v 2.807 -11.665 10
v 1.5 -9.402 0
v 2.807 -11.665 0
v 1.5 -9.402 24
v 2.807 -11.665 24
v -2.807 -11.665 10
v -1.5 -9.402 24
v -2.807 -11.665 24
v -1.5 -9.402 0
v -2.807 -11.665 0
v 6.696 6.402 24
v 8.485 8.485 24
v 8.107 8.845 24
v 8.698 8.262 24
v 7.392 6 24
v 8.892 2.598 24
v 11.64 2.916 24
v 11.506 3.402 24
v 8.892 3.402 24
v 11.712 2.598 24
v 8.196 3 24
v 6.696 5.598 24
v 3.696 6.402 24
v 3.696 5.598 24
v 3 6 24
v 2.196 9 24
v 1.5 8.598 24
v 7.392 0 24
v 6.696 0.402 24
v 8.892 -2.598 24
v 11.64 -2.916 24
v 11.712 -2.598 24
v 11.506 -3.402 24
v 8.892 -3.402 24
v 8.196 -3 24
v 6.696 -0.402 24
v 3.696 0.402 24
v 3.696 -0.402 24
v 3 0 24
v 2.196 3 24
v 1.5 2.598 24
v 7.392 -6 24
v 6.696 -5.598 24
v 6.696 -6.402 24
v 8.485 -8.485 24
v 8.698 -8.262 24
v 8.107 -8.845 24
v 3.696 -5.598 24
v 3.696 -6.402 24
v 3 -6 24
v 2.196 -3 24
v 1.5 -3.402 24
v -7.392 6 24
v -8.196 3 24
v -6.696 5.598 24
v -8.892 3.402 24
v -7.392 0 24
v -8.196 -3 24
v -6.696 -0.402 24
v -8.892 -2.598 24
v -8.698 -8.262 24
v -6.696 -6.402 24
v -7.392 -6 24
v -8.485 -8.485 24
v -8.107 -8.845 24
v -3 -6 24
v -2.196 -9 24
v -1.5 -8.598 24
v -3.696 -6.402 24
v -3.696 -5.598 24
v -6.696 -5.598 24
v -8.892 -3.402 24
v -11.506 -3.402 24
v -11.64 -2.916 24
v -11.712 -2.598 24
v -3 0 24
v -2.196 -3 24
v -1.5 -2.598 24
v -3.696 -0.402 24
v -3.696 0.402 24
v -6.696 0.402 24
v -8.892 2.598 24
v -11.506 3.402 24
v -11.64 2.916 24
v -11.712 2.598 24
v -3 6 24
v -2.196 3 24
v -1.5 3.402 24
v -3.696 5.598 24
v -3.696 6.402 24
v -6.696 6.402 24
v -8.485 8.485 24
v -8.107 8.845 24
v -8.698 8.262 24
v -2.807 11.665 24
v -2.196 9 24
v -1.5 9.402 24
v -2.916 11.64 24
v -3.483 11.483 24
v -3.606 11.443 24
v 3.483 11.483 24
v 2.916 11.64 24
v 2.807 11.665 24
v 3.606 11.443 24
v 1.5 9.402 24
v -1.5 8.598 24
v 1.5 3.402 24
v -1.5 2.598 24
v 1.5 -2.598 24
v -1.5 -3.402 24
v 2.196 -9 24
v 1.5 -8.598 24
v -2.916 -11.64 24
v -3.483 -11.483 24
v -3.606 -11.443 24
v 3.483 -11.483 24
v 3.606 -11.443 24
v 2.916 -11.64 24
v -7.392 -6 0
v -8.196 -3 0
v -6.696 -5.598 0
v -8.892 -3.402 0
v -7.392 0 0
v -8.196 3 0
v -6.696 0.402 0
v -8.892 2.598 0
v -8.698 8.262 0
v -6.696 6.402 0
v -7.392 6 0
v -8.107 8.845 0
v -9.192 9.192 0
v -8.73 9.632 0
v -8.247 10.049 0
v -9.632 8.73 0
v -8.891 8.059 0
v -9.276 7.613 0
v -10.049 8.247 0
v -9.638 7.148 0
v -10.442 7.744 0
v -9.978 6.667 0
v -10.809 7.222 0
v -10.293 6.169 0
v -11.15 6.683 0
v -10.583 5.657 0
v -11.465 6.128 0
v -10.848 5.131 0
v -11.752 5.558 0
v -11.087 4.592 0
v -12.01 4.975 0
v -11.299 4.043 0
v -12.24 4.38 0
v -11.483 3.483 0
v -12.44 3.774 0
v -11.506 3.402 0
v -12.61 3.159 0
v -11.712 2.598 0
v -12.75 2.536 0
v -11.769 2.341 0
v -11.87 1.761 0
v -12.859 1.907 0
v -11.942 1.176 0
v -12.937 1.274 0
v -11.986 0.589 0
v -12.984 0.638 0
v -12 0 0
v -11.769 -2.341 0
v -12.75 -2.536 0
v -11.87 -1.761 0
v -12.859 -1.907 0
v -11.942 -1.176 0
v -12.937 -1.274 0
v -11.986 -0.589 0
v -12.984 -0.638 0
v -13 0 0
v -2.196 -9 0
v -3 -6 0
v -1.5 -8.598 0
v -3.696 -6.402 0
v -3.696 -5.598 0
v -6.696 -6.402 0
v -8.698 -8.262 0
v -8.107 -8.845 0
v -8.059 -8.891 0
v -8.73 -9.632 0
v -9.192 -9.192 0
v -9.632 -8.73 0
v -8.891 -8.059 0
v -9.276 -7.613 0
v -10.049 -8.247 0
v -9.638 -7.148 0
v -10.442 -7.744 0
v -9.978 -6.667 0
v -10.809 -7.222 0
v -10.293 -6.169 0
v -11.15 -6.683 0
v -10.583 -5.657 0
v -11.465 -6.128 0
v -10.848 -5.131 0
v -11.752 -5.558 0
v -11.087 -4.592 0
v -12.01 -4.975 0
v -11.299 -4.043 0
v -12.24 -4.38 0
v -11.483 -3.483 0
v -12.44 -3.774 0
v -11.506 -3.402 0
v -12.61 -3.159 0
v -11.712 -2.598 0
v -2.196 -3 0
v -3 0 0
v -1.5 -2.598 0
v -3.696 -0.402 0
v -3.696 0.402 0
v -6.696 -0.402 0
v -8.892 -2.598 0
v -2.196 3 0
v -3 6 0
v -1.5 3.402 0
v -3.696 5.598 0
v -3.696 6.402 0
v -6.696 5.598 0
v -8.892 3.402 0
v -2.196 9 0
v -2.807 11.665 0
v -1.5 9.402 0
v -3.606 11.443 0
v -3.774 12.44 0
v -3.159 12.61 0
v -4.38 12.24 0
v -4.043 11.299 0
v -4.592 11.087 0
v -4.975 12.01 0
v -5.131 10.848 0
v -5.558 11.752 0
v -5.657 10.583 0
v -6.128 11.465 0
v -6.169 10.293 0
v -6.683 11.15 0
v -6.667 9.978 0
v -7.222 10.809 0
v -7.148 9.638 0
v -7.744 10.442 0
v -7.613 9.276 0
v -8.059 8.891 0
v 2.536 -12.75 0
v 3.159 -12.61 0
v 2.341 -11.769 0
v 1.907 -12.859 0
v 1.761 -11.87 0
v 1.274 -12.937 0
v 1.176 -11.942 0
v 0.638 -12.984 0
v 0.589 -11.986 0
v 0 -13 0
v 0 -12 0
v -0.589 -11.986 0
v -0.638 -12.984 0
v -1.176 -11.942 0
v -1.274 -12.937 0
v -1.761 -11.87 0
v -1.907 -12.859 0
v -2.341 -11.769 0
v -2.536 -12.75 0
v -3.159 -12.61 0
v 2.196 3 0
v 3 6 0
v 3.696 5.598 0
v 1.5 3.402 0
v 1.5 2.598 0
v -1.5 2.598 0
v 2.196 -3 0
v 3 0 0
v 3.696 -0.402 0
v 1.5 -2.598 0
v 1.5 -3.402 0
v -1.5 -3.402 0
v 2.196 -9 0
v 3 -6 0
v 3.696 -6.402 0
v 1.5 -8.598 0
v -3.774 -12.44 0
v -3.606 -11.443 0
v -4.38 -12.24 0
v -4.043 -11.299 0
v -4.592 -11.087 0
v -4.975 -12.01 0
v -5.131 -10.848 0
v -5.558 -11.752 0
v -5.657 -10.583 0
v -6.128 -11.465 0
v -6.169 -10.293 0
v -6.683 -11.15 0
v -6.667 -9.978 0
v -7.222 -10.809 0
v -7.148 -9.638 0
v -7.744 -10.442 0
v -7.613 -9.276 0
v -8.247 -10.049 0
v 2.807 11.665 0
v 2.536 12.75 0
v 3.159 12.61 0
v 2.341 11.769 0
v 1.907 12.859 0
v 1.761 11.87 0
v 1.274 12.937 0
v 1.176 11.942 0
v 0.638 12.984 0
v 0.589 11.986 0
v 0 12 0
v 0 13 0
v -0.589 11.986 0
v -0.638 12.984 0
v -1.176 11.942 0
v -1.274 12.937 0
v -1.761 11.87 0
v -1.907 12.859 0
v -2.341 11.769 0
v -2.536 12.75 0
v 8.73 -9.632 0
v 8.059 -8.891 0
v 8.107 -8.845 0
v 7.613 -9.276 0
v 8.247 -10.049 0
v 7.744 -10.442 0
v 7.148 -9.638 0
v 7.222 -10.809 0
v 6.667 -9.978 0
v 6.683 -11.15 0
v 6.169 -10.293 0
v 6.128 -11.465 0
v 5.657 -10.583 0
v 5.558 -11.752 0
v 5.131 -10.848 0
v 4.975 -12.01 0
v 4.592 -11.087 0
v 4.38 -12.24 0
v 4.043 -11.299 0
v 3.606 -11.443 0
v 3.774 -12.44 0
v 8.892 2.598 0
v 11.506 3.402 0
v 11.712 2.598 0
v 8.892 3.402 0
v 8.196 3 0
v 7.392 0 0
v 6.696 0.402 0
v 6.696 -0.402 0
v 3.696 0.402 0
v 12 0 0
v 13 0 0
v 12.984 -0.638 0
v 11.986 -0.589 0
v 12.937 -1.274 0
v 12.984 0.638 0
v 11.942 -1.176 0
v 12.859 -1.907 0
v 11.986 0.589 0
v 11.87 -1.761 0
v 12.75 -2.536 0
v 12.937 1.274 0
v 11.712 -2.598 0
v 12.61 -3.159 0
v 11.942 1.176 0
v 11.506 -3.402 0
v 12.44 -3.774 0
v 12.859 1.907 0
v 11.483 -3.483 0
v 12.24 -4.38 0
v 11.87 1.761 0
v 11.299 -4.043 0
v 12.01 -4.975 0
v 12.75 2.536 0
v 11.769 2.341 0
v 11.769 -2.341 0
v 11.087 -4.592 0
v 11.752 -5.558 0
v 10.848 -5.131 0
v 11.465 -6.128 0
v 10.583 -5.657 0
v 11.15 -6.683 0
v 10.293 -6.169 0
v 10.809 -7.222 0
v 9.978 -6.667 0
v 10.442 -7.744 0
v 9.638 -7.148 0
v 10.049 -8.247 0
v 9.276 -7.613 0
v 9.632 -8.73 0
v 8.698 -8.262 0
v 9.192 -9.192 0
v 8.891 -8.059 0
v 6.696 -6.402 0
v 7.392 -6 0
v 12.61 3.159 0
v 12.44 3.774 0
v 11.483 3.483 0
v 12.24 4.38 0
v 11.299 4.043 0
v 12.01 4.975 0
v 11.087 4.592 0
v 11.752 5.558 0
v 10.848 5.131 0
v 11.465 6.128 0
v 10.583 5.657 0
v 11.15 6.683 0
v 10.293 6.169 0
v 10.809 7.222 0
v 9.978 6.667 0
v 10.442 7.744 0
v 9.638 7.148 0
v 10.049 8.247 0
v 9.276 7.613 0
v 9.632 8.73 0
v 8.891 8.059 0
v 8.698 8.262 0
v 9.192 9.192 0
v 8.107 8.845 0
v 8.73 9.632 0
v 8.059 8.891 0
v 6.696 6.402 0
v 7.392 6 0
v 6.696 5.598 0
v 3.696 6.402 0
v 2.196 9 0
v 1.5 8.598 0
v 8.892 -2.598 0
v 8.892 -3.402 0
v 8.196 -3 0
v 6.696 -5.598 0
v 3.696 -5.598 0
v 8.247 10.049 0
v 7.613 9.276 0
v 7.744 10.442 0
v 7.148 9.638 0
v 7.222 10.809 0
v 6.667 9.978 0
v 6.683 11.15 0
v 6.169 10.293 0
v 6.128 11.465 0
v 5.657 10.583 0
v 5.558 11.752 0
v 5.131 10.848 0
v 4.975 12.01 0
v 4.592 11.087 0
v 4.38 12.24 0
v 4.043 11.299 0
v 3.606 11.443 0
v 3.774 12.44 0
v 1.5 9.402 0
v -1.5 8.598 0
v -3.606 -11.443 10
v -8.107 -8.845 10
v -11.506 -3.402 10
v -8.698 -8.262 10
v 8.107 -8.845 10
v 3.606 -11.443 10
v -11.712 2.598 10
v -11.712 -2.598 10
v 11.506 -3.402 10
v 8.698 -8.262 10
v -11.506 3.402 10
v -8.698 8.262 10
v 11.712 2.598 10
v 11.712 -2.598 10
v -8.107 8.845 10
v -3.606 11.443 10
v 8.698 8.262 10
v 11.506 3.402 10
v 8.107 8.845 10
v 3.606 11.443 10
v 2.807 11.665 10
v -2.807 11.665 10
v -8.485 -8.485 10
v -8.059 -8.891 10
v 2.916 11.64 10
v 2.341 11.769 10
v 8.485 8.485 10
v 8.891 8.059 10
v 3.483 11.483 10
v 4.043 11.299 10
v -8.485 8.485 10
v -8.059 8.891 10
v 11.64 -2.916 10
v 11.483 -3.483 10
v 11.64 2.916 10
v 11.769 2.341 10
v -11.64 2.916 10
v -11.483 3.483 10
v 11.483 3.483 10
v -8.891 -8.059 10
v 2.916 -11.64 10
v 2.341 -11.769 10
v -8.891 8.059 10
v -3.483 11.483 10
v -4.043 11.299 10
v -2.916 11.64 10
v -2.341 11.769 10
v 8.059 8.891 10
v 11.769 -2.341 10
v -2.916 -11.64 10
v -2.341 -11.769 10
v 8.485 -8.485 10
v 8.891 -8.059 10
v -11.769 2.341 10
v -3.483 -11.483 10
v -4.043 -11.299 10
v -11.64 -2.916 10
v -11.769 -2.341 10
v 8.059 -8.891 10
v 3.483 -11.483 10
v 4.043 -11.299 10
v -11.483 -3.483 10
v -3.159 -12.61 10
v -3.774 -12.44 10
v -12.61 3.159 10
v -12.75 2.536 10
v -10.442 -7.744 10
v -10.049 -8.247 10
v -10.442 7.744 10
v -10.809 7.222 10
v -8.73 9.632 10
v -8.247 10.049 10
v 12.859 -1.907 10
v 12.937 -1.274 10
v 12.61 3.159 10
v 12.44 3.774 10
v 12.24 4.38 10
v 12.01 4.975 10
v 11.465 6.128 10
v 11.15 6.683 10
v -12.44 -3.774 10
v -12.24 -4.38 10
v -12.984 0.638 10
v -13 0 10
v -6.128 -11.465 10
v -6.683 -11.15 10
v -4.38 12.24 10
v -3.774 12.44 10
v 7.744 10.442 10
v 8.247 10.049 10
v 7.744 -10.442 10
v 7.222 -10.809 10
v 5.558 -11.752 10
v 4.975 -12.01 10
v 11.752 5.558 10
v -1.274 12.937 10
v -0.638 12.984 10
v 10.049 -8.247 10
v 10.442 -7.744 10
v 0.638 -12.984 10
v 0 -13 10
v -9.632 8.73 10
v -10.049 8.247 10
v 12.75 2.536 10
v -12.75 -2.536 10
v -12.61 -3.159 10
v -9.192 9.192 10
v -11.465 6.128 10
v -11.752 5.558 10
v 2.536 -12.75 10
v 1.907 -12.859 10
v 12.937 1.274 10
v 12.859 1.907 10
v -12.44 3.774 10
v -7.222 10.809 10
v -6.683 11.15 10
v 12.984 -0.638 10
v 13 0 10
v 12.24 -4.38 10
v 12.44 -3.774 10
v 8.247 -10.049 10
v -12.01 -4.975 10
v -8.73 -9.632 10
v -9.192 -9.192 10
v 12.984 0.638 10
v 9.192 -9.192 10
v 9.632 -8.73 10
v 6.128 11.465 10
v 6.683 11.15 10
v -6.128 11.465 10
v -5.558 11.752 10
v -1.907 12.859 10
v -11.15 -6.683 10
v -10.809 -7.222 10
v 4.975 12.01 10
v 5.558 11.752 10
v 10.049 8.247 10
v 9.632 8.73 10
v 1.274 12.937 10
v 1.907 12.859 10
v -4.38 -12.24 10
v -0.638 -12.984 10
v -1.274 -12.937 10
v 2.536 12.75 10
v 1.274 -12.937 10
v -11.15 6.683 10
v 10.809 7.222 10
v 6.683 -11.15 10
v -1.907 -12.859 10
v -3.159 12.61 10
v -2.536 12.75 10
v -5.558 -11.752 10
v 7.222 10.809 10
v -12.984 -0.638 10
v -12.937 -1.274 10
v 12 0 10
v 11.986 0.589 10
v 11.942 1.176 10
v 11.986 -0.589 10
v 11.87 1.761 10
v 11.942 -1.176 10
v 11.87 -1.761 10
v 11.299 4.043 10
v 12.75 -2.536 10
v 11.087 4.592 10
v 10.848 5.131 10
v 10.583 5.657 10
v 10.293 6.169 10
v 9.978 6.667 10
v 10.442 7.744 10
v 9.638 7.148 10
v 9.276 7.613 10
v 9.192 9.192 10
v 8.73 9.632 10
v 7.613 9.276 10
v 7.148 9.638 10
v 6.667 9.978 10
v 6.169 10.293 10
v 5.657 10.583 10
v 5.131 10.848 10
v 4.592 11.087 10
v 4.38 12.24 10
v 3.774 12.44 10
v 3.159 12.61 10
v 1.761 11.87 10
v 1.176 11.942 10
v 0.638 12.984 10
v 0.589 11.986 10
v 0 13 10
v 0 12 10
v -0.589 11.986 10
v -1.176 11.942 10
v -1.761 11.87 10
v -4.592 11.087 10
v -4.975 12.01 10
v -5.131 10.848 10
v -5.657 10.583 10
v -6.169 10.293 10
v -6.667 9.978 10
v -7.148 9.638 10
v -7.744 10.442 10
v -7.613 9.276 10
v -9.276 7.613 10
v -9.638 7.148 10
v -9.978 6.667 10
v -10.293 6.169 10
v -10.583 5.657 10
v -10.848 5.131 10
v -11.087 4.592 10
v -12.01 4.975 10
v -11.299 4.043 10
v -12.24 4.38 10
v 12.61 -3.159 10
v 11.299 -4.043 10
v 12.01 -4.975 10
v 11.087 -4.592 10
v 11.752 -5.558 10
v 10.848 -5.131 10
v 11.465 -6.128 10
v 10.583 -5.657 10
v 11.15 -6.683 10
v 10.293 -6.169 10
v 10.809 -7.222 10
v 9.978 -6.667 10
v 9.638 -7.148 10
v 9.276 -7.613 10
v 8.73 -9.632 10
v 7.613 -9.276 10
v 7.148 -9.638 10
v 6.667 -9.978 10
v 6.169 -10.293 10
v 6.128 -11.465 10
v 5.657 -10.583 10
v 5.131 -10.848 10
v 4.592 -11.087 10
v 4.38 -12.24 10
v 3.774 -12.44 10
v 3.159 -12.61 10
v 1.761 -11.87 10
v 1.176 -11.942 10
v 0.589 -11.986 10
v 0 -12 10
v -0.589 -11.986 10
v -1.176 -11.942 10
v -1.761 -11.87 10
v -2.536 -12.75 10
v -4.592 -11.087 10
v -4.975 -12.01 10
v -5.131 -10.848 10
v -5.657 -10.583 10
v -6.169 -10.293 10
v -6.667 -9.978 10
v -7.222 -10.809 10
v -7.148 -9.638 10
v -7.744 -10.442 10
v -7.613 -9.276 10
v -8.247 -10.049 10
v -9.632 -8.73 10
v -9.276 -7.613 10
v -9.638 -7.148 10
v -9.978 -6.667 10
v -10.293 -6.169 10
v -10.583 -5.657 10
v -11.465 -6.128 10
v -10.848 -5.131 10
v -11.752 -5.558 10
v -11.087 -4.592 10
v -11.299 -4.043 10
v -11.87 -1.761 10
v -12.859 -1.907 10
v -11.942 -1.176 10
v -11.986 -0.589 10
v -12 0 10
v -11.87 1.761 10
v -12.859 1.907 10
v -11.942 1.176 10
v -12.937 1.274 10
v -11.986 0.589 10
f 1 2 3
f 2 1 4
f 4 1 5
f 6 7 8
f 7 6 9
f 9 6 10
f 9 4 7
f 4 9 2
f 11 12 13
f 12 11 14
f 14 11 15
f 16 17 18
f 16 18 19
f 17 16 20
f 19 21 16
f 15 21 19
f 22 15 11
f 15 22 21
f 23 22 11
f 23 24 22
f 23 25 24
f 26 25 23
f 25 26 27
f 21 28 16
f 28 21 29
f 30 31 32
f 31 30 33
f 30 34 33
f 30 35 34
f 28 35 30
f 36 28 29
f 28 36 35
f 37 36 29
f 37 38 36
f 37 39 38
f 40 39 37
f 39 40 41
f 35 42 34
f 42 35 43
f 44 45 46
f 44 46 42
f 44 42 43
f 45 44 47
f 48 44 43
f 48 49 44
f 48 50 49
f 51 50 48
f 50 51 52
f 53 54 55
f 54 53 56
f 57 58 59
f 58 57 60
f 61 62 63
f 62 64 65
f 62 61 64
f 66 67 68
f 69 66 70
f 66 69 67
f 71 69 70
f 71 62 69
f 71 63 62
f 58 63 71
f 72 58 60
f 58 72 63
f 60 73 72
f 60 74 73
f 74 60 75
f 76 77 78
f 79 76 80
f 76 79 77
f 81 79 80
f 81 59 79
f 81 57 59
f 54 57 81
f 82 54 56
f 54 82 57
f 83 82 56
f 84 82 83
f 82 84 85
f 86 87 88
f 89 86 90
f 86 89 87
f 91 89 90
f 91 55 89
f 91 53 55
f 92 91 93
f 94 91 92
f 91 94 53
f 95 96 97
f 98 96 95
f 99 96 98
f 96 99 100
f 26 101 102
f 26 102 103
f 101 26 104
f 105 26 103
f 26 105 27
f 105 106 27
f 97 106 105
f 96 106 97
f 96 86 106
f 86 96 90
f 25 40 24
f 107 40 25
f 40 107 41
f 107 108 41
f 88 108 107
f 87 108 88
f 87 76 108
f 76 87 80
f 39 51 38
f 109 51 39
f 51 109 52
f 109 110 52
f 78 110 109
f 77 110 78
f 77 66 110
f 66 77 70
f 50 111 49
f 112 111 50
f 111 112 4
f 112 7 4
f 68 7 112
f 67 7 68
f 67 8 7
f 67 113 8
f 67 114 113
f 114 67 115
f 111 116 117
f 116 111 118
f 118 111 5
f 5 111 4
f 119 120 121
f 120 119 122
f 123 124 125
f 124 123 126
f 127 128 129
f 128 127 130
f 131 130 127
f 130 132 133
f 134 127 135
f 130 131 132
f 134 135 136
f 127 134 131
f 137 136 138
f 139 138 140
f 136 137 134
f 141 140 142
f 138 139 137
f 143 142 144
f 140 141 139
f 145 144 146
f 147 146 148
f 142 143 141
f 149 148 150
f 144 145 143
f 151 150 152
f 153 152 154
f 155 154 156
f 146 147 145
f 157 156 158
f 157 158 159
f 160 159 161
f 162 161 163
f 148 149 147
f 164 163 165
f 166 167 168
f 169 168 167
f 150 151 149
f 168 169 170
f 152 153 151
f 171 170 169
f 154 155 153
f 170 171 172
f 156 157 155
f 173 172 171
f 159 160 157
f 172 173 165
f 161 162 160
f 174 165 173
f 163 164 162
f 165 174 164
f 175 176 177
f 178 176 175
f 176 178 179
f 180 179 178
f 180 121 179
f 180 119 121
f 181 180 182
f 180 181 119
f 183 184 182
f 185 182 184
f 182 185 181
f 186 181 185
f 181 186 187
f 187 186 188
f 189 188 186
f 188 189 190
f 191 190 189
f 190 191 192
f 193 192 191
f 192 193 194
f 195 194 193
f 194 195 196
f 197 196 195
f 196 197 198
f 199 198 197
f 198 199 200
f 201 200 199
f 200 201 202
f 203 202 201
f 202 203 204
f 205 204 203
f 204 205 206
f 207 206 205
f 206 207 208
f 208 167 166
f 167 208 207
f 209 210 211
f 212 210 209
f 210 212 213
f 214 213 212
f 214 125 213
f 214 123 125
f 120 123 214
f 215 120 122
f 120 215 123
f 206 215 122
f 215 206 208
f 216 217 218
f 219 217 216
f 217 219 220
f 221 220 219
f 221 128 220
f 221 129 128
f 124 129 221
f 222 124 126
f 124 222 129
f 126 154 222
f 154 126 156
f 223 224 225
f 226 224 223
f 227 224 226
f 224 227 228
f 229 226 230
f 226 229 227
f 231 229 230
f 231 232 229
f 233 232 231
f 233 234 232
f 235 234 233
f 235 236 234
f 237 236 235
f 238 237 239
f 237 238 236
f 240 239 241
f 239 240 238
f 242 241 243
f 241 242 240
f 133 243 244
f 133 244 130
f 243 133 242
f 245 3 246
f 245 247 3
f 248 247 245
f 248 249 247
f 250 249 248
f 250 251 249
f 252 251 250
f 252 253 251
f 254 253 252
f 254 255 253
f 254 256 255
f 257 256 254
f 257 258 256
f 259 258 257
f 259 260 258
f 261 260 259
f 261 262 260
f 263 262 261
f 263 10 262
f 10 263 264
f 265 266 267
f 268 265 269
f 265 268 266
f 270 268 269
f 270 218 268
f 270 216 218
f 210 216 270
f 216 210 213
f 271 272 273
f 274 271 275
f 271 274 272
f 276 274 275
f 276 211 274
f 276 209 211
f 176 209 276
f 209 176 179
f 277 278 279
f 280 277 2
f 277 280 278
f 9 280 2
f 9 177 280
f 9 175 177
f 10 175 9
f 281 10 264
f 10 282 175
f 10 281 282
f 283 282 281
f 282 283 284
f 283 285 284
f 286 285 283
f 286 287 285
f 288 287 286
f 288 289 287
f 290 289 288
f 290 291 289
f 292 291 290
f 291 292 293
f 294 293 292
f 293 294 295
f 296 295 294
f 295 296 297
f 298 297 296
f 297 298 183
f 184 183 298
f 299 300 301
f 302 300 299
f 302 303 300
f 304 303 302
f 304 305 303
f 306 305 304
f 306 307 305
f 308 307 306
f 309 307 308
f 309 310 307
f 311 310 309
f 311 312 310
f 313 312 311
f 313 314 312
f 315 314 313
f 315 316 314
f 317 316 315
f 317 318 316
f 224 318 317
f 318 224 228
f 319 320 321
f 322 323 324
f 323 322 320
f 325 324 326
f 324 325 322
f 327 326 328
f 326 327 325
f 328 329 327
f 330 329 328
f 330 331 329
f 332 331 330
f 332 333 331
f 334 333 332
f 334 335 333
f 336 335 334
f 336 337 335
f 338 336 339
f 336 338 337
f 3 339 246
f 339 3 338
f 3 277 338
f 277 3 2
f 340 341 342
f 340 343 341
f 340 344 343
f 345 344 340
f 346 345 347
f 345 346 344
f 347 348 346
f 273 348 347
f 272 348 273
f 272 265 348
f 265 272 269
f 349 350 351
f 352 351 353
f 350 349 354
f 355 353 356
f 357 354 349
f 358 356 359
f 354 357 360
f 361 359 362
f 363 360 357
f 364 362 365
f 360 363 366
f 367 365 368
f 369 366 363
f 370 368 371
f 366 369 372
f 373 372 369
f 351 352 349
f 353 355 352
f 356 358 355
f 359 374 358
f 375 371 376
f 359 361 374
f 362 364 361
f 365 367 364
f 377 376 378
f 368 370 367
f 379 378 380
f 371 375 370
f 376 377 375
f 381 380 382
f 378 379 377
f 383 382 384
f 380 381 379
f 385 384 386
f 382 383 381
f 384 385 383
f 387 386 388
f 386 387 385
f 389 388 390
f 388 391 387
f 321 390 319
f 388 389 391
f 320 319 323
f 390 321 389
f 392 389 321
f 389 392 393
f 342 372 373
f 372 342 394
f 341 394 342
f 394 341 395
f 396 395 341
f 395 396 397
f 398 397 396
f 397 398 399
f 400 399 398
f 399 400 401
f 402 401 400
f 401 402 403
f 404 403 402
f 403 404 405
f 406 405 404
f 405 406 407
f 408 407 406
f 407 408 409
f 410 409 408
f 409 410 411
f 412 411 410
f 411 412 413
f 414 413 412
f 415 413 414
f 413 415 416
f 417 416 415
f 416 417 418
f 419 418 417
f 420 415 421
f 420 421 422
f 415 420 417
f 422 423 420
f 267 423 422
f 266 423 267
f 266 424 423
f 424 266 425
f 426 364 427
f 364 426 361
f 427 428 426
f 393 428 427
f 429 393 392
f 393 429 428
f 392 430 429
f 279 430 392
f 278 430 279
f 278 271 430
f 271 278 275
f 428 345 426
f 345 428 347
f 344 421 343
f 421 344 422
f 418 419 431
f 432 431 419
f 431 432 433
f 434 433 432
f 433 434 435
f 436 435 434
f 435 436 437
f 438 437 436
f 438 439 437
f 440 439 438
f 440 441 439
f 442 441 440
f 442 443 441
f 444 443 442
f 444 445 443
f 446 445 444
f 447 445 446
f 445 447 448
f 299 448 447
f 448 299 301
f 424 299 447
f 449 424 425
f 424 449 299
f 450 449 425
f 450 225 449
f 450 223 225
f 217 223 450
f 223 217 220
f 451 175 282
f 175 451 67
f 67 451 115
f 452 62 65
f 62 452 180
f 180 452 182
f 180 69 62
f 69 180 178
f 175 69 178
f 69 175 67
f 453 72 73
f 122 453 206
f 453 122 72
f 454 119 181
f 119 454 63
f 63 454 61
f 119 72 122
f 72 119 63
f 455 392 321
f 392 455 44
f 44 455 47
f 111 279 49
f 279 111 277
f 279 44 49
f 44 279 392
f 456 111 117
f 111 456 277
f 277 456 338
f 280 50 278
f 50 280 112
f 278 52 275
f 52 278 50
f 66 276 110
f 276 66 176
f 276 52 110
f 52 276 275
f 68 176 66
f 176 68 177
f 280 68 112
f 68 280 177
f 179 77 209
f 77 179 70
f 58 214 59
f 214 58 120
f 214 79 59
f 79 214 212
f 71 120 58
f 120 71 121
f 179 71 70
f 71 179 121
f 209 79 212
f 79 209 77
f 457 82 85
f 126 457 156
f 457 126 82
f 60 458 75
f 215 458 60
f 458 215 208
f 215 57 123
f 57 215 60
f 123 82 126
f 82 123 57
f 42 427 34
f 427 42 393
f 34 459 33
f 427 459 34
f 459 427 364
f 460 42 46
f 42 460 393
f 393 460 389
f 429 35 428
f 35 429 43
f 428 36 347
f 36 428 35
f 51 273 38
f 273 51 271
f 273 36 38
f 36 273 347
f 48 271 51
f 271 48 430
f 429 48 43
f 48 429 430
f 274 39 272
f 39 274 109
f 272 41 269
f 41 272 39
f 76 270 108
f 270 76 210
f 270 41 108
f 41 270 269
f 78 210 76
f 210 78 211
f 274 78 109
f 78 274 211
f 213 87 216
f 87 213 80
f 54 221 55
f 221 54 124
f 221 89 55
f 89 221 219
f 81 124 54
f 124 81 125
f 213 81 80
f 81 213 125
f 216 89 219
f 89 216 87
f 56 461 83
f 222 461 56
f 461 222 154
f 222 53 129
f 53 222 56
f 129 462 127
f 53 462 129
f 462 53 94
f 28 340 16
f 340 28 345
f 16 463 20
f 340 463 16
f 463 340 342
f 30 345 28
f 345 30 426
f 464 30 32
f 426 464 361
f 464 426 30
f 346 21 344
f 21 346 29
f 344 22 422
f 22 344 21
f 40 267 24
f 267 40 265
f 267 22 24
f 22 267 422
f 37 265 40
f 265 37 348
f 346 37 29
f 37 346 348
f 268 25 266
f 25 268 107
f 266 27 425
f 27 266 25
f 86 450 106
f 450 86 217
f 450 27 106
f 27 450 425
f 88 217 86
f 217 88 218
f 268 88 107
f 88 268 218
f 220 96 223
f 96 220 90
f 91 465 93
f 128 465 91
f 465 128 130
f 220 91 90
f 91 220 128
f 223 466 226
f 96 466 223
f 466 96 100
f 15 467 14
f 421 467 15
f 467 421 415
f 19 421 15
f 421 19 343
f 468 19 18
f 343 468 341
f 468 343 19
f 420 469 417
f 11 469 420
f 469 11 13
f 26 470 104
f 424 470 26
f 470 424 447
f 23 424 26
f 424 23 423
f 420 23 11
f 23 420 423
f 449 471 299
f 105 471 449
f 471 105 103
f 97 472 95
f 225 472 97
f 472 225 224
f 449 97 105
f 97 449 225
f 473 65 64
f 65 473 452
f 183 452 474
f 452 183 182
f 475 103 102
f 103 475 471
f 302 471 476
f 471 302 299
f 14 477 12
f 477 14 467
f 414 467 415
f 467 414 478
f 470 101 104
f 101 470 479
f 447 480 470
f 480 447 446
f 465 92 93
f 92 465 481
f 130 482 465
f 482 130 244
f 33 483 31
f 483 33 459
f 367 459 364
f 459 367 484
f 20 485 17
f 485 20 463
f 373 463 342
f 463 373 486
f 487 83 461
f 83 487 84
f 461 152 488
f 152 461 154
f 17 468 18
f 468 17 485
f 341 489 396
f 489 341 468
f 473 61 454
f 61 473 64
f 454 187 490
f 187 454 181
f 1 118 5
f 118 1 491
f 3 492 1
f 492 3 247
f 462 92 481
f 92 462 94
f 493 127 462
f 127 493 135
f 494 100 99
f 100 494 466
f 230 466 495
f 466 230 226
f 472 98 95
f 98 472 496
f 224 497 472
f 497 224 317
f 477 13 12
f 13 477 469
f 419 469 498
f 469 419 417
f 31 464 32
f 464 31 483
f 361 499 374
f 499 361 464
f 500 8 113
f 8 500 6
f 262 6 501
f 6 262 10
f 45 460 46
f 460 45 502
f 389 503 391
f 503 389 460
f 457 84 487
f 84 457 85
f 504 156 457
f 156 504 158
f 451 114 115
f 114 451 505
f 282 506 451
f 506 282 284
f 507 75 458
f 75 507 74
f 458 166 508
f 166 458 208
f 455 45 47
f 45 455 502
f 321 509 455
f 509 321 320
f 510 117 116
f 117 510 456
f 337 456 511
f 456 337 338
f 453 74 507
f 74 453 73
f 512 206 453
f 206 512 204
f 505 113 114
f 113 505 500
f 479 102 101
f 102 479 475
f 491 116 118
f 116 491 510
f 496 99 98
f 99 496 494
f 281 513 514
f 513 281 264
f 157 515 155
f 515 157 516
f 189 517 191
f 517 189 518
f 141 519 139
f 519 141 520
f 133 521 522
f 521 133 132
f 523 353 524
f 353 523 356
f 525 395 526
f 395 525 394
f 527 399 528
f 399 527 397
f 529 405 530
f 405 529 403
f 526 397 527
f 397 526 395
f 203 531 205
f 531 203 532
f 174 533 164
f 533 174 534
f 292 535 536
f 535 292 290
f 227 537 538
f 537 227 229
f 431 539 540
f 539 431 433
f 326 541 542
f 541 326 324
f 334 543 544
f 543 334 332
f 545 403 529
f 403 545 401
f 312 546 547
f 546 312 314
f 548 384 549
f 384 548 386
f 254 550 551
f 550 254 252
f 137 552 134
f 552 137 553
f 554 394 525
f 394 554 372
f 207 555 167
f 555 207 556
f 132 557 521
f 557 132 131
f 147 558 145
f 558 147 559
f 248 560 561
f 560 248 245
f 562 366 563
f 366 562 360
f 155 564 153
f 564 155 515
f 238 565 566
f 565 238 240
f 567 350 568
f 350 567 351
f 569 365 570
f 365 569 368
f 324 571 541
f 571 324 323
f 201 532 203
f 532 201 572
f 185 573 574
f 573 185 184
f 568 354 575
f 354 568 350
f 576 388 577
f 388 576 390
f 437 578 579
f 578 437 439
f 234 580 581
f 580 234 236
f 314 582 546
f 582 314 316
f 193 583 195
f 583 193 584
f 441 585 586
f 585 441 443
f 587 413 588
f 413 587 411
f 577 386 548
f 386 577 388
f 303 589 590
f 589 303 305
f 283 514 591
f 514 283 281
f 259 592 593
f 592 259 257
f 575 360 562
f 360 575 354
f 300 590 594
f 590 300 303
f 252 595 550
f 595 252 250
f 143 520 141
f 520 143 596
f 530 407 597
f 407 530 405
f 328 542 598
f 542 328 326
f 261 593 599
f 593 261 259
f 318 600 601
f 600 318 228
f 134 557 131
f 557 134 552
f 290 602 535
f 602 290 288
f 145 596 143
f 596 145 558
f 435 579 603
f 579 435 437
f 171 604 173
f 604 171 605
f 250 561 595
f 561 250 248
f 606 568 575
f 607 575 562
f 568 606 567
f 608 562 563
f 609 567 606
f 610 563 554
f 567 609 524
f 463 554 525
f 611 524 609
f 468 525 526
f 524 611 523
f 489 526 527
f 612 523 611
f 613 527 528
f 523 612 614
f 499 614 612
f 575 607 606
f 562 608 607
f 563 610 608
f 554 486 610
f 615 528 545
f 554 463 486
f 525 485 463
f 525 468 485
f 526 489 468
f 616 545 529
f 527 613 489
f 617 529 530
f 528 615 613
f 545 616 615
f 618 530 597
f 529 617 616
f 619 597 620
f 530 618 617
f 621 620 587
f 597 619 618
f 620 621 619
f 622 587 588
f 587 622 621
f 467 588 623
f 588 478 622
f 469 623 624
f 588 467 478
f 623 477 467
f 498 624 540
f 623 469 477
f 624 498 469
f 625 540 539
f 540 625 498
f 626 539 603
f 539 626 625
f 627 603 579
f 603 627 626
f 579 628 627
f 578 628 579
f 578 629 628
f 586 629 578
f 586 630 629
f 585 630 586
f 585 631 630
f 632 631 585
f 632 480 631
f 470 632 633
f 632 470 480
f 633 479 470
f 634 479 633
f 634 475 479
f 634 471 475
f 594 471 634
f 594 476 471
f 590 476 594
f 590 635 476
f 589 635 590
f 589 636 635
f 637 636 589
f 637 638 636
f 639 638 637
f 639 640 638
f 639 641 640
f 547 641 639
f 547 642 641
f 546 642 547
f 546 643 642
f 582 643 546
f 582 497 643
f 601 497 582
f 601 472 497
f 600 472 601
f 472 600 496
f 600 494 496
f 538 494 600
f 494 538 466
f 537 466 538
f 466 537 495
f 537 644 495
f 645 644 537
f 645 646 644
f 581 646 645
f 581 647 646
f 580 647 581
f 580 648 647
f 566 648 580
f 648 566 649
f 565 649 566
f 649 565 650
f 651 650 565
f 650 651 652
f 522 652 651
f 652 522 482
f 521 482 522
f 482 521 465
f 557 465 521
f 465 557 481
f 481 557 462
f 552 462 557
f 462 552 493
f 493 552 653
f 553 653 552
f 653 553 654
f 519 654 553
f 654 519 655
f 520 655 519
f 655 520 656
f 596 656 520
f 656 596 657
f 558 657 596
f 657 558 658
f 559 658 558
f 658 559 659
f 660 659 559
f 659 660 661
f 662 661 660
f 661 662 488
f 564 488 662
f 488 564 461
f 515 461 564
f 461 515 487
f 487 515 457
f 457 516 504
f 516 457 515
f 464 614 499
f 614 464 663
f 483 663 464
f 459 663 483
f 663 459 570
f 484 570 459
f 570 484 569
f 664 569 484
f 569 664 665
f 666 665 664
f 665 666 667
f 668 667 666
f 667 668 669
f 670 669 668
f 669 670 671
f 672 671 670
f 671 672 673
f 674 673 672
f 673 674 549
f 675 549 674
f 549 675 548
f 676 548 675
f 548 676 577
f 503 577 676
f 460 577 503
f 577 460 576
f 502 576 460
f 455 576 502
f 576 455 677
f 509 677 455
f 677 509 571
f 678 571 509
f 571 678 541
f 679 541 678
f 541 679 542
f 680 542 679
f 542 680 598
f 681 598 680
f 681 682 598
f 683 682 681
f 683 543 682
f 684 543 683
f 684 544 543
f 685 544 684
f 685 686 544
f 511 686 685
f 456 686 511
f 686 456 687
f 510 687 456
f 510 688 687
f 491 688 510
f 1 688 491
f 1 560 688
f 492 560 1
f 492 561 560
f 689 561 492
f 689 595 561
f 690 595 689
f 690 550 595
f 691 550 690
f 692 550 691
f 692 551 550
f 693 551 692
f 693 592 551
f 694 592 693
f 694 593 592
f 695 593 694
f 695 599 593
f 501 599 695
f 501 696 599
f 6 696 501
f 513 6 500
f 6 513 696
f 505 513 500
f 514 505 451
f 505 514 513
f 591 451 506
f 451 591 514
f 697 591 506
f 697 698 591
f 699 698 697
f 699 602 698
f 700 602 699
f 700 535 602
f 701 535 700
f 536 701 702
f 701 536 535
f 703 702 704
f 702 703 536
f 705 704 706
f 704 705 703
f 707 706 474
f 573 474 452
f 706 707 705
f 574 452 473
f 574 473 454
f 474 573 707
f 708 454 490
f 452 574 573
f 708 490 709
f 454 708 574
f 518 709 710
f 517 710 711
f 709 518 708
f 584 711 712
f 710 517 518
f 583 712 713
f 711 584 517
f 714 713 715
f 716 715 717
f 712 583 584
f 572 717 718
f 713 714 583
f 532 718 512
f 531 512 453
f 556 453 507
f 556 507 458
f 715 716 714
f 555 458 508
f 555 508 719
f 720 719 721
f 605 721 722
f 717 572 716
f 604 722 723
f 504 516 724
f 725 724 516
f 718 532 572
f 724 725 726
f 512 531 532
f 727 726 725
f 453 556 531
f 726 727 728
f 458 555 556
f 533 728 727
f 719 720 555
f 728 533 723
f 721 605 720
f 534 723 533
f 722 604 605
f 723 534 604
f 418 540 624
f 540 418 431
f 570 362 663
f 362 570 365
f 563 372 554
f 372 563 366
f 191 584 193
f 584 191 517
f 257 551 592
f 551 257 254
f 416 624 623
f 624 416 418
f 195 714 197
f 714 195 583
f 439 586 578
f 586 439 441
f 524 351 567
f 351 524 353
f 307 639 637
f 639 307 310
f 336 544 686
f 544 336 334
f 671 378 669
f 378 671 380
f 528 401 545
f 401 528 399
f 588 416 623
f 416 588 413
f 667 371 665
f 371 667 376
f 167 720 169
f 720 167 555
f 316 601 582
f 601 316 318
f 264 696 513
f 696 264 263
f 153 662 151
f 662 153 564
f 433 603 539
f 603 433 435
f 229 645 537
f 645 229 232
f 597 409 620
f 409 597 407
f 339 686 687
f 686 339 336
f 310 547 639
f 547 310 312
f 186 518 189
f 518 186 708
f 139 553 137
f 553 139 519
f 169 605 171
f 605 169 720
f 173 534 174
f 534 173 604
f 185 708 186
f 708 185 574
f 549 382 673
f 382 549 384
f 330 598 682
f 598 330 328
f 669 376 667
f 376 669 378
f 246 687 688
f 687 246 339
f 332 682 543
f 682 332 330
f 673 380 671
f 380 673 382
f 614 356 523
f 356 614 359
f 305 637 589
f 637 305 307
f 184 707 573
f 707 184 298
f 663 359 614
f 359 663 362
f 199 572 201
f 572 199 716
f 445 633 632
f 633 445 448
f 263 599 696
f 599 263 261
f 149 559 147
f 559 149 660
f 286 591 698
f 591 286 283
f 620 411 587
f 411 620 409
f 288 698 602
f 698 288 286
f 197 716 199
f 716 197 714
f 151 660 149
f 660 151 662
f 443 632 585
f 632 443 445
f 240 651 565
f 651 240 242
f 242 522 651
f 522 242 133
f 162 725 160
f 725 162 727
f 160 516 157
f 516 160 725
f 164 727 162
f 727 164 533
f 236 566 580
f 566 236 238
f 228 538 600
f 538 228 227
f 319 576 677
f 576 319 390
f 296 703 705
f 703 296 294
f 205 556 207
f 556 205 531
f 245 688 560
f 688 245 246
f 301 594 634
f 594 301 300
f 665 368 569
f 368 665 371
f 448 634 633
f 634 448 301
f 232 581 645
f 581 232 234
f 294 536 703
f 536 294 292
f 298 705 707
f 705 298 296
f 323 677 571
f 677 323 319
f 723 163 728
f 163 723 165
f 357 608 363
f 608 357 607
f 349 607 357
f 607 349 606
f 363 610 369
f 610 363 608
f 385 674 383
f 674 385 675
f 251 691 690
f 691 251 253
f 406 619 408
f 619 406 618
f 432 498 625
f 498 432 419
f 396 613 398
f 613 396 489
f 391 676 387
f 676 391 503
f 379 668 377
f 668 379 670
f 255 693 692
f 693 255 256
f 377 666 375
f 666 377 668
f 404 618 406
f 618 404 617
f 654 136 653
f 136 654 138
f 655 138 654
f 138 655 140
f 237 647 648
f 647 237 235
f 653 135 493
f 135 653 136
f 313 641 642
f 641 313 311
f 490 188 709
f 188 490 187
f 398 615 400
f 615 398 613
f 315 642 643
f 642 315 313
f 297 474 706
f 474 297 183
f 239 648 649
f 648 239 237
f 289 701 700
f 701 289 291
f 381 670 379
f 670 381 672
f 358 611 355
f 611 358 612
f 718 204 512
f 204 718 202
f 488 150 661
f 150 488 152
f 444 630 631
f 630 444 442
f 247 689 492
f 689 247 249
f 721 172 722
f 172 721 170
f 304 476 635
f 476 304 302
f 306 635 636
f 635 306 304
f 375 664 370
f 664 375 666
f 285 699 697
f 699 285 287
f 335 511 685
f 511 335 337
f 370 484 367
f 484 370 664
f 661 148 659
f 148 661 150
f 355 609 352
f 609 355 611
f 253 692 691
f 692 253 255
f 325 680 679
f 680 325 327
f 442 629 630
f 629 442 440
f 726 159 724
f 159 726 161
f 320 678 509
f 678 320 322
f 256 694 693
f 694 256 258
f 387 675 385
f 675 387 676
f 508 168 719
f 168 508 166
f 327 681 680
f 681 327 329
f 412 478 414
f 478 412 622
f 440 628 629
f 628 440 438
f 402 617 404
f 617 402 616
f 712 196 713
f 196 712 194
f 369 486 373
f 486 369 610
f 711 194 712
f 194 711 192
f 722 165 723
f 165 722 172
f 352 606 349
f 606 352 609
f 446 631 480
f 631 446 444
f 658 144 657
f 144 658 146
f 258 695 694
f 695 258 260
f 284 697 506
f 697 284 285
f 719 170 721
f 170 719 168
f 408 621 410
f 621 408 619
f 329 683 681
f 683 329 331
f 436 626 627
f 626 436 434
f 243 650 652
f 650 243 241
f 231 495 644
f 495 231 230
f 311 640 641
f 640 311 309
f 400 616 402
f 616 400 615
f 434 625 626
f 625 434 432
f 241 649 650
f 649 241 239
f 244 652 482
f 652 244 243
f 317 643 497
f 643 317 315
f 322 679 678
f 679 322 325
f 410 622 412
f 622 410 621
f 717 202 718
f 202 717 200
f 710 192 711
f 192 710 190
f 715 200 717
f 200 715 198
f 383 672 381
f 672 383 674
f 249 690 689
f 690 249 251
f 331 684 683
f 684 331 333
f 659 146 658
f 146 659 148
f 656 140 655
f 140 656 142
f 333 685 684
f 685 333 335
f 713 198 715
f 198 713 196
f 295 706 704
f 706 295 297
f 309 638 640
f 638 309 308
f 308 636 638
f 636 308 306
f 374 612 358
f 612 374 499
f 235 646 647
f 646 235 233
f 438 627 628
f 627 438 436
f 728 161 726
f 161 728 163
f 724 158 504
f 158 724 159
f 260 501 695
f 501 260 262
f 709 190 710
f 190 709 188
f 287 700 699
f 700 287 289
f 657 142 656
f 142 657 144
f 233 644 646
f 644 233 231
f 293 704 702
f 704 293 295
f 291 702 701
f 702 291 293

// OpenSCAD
//scope killflash version 1.0

//all units mm
//https://openscad.cloud/openscad/ for testing
//adjust these values
scope_inner_diameter = 24;
scope_outer_diameter = 26;
scope_depth = 24;
lip_depth = 10;
hex_diam = 6;

module hexagon(diam)
{
  cylinder(h=scope_depth, d=diam,$fn=6);
}

module draw_hexagon(x,y)
{
    for(y = [-(y/2):1:(y/2)])
    {
        translate([0,hex_diam*y,0])
                {
                    for(ang = [60])
            {
            rotate(ang)
            for(x = [-(x/2):1:(x/2)])
            {
                translate([0,hex_diam*x,0])
                {
                    hexagon(hex_diam);
                }
            }
            }
                }
    }        
}
module make_hexagon()
{
total_width=hex_diam+scope_inner_diameter;
latt_quant = ceil(total_width/hex_diam);
if (latt_quant % 2 == 0) draw_hexagon(latt_quant+0,latt_quant+0);
else {draw_hexagon(latt_quant+1,latt_quant+1);}
}

union()
{
difference()
{
    cylinder(h=scope_depth, d=scope_inner_diameter,$fn=128);
    intersection()
        {
            make_hexagon();
            cylinder(h=scope_depth, d=scope_inner_diameter,$fn=128);
        }
}

difference()
{
    cylinder(h=lip_depth, d=scope_outer_diameter,$fn=128);
    cylinder(h=lip_depth, d=scope_inner_diameter,$fn=128);
}    
}
